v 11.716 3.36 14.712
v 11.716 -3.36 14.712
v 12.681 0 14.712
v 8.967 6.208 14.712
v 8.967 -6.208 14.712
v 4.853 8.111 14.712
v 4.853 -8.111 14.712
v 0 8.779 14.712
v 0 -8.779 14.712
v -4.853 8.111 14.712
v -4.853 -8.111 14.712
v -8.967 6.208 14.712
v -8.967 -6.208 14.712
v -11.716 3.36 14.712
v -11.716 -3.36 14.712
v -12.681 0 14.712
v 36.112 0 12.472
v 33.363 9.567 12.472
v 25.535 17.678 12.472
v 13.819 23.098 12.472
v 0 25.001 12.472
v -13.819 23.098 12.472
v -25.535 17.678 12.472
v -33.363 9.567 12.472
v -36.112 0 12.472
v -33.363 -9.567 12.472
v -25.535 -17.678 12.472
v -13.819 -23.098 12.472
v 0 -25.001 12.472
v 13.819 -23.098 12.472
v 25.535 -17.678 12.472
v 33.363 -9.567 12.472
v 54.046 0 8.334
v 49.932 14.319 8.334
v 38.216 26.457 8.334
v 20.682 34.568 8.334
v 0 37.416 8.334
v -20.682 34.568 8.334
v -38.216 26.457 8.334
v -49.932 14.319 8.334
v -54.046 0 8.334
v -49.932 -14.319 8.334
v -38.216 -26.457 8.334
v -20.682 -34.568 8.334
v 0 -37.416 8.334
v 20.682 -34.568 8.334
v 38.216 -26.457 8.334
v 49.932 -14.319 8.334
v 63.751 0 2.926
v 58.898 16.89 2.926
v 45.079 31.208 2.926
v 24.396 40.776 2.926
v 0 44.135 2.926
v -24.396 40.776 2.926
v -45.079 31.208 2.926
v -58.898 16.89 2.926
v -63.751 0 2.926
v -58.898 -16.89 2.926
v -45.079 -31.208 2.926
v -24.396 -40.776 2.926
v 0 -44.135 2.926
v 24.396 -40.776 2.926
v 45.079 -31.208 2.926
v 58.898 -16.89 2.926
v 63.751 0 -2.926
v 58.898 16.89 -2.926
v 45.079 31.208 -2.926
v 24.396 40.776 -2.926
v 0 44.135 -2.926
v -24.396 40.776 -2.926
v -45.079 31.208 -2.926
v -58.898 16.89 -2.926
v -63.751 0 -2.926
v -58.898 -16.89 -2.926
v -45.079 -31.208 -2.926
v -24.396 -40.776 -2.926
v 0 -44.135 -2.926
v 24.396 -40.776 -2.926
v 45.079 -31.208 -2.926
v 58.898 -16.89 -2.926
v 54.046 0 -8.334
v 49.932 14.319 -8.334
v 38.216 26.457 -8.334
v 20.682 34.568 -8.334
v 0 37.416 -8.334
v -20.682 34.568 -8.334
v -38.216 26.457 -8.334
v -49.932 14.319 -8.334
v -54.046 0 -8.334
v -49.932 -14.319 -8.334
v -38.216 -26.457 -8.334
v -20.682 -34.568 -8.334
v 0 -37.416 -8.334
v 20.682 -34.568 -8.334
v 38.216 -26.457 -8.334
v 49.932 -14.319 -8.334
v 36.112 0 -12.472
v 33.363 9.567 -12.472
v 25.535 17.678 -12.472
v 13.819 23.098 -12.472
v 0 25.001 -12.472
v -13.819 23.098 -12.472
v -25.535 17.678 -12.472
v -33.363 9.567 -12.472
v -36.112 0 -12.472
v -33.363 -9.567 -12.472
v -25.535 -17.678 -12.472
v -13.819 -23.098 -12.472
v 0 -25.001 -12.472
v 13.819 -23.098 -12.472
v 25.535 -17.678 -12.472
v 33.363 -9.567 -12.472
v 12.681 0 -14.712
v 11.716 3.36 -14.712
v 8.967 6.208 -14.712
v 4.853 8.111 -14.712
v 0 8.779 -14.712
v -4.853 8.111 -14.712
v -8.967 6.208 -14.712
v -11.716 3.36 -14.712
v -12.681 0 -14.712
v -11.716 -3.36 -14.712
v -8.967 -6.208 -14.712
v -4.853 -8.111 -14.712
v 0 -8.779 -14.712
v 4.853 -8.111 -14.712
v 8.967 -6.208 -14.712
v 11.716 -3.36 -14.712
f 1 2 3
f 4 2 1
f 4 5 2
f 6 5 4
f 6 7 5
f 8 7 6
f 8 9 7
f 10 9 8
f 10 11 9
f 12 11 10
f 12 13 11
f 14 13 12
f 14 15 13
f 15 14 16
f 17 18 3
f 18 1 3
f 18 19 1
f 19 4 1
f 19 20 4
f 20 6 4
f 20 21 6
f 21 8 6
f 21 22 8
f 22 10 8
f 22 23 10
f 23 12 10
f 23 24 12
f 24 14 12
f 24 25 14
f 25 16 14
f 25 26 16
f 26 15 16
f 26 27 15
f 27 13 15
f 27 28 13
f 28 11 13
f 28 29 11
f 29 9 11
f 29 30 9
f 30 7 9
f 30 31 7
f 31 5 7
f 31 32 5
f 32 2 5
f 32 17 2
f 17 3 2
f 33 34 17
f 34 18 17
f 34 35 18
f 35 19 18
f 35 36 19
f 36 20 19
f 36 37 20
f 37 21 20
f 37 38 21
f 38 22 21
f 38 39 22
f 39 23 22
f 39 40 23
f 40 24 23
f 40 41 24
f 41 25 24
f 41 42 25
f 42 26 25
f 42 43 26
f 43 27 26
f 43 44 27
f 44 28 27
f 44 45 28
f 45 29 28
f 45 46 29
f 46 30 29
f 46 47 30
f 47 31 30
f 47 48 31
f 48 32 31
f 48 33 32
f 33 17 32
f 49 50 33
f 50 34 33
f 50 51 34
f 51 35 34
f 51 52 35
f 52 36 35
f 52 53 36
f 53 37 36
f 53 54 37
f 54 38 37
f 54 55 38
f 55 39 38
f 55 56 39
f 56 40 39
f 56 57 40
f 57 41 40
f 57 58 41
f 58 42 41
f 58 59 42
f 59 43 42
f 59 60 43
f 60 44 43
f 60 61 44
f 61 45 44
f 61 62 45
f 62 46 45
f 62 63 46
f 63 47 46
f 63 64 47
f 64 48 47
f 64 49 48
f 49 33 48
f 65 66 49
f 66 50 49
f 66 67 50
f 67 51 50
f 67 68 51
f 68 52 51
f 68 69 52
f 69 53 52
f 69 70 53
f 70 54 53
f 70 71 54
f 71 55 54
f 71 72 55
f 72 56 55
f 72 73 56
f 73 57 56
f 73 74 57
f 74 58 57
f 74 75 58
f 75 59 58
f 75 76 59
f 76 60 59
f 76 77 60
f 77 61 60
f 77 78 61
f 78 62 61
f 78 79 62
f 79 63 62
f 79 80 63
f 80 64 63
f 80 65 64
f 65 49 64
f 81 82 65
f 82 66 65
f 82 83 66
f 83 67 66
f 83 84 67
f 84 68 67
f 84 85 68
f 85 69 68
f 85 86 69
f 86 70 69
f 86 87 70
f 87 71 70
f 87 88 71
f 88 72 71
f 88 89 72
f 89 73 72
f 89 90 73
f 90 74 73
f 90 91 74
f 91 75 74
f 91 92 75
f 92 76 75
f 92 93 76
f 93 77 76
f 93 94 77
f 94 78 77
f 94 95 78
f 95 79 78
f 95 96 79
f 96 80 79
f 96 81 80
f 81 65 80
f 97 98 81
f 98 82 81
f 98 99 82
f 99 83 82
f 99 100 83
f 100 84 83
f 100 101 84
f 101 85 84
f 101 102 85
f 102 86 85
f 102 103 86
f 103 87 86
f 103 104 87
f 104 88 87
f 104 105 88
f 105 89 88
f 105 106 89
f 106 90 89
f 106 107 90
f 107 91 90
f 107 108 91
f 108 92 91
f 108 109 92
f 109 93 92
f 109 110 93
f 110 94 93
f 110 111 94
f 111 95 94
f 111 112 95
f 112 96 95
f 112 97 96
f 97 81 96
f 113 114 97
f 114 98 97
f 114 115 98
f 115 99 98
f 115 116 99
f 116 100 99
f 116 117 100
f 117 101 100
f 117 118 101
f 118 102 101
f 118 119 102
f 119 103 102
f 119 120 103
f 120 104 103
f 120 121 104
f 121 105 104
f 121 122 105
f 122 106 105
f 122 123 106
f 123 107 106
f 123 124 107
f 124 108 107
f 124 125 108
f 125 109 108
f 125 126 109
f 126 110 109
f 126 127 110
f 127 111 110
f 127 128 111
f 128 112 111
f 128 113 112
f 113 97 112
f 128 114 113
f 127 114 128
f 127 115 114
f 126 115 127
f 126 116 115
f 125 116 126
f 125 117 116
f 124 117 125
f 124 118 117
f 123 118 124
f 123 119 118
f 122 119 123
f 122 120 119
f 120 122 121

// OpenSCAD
// Generated by SolidPython 1.0.1 on 2020-07-29 00:46:50


scale(v = [13, 9, 3]) {
	sphere(r = 5);
}
/***********************************************
*********      SolidPython code:      **********
************************************************
 
# import packages: SolidPython
from solid import *
from solid.utils import *
from itertools import chain, combinations, permutations


class Resize:

    def __init__(self, scad_file):
        self.scad_file = scad_file
        #self.scad_file = import_scad(scad_file)
        # cone/cylinder param:
        self.r1 = 0
        self.r2 = 0
        self.h = 0
        # rectangular prism param:
        self.w = 0
        self.l = 0
        # ellipse param:
        self.r = 0

    # import OpenScad code (file name corresponds to shape)


    # classify shape + parameters
    def assign(self, param1, param2, param3):
        if self.scad_file == 'cone.scad':
            self.r1 = param1
            self.r2 = param2
            self.h = param3
        elif self.scad_file == 'cylinder.scad':
            self.r1 = param1
            self.r2 = param2
            self.h = param3
        elif self.scad_file == 'rectangularPrism.scad':
            self.h = param1
            self.l = param2
            self.w = param3
        else:
            self.r = param1
            self.h = param2

    # resize parameters
    def iterate(self):
        x = range(3, 20, 2)
        i = 1
        if self.scad_file == 'cone.scad':
            tempList = list(permutations(x, 2))
            for temp in tempList:
                param1 = temp[0]
                param2 = temp[1]
                filepath = 'produced_scad_files/' + 'cone' + str(param1) + '_' + str(param2) + '_' + '.scad'
                scad_render_to_file(cylinder(h=param1, r1=param2, r2=0), filepath)

        elif self.scad_file == 'cylinder.scad':
            tempList = list(permutations(x, 3))
            for temp in tempList:
                param1 = temp[0]
                param2 = temp[1]
                filepath = 'produced_scad_files/' + 'cylinder' + str(param1) + '_' + str(param2) + '_' + '.scad'
                scad_render_to_file(cylinder(h=param1, r1=param2, r2=param2), filepath)

        elif self.scad_file == 'rectangularPrism.scad':
            tempList = list(permutations(x, 3))
            for temp in tempList:
                param1 = temp[0]
                param2 = temp[1]
                param3 = temp[2]
                filepath = 'produced_scad_files/' + 'rectangularPrism' + str(param1) + '_' + str(param2) + '_' + str(
                    param3) + '.scad'
                scad_render_to_file(cube(size=(param1, param2, param3)), filepath)

        elif self.scad_file == 'ellipse.scad':
            tempList = list(permutations(x, 4))
            for temp in tempList:
                param1 = temp[0]
                param2 = temp[1]
                param3 = temp[2]
                param4 = temp[3]
                filepath = 'produced_scad_files/' + 'ellipse' + str(param1) + '_' + str(param2) + '_' + str(param3) + '_' + str(param4) + '.scad'
                scad_render_to_file(scale([param1, param2, param3])(sphere(r=param4)), filepath)

    def render_to_scadfile(self):
        scad_render_to_file(scad, 'example.scad') 
 
************************************************/
